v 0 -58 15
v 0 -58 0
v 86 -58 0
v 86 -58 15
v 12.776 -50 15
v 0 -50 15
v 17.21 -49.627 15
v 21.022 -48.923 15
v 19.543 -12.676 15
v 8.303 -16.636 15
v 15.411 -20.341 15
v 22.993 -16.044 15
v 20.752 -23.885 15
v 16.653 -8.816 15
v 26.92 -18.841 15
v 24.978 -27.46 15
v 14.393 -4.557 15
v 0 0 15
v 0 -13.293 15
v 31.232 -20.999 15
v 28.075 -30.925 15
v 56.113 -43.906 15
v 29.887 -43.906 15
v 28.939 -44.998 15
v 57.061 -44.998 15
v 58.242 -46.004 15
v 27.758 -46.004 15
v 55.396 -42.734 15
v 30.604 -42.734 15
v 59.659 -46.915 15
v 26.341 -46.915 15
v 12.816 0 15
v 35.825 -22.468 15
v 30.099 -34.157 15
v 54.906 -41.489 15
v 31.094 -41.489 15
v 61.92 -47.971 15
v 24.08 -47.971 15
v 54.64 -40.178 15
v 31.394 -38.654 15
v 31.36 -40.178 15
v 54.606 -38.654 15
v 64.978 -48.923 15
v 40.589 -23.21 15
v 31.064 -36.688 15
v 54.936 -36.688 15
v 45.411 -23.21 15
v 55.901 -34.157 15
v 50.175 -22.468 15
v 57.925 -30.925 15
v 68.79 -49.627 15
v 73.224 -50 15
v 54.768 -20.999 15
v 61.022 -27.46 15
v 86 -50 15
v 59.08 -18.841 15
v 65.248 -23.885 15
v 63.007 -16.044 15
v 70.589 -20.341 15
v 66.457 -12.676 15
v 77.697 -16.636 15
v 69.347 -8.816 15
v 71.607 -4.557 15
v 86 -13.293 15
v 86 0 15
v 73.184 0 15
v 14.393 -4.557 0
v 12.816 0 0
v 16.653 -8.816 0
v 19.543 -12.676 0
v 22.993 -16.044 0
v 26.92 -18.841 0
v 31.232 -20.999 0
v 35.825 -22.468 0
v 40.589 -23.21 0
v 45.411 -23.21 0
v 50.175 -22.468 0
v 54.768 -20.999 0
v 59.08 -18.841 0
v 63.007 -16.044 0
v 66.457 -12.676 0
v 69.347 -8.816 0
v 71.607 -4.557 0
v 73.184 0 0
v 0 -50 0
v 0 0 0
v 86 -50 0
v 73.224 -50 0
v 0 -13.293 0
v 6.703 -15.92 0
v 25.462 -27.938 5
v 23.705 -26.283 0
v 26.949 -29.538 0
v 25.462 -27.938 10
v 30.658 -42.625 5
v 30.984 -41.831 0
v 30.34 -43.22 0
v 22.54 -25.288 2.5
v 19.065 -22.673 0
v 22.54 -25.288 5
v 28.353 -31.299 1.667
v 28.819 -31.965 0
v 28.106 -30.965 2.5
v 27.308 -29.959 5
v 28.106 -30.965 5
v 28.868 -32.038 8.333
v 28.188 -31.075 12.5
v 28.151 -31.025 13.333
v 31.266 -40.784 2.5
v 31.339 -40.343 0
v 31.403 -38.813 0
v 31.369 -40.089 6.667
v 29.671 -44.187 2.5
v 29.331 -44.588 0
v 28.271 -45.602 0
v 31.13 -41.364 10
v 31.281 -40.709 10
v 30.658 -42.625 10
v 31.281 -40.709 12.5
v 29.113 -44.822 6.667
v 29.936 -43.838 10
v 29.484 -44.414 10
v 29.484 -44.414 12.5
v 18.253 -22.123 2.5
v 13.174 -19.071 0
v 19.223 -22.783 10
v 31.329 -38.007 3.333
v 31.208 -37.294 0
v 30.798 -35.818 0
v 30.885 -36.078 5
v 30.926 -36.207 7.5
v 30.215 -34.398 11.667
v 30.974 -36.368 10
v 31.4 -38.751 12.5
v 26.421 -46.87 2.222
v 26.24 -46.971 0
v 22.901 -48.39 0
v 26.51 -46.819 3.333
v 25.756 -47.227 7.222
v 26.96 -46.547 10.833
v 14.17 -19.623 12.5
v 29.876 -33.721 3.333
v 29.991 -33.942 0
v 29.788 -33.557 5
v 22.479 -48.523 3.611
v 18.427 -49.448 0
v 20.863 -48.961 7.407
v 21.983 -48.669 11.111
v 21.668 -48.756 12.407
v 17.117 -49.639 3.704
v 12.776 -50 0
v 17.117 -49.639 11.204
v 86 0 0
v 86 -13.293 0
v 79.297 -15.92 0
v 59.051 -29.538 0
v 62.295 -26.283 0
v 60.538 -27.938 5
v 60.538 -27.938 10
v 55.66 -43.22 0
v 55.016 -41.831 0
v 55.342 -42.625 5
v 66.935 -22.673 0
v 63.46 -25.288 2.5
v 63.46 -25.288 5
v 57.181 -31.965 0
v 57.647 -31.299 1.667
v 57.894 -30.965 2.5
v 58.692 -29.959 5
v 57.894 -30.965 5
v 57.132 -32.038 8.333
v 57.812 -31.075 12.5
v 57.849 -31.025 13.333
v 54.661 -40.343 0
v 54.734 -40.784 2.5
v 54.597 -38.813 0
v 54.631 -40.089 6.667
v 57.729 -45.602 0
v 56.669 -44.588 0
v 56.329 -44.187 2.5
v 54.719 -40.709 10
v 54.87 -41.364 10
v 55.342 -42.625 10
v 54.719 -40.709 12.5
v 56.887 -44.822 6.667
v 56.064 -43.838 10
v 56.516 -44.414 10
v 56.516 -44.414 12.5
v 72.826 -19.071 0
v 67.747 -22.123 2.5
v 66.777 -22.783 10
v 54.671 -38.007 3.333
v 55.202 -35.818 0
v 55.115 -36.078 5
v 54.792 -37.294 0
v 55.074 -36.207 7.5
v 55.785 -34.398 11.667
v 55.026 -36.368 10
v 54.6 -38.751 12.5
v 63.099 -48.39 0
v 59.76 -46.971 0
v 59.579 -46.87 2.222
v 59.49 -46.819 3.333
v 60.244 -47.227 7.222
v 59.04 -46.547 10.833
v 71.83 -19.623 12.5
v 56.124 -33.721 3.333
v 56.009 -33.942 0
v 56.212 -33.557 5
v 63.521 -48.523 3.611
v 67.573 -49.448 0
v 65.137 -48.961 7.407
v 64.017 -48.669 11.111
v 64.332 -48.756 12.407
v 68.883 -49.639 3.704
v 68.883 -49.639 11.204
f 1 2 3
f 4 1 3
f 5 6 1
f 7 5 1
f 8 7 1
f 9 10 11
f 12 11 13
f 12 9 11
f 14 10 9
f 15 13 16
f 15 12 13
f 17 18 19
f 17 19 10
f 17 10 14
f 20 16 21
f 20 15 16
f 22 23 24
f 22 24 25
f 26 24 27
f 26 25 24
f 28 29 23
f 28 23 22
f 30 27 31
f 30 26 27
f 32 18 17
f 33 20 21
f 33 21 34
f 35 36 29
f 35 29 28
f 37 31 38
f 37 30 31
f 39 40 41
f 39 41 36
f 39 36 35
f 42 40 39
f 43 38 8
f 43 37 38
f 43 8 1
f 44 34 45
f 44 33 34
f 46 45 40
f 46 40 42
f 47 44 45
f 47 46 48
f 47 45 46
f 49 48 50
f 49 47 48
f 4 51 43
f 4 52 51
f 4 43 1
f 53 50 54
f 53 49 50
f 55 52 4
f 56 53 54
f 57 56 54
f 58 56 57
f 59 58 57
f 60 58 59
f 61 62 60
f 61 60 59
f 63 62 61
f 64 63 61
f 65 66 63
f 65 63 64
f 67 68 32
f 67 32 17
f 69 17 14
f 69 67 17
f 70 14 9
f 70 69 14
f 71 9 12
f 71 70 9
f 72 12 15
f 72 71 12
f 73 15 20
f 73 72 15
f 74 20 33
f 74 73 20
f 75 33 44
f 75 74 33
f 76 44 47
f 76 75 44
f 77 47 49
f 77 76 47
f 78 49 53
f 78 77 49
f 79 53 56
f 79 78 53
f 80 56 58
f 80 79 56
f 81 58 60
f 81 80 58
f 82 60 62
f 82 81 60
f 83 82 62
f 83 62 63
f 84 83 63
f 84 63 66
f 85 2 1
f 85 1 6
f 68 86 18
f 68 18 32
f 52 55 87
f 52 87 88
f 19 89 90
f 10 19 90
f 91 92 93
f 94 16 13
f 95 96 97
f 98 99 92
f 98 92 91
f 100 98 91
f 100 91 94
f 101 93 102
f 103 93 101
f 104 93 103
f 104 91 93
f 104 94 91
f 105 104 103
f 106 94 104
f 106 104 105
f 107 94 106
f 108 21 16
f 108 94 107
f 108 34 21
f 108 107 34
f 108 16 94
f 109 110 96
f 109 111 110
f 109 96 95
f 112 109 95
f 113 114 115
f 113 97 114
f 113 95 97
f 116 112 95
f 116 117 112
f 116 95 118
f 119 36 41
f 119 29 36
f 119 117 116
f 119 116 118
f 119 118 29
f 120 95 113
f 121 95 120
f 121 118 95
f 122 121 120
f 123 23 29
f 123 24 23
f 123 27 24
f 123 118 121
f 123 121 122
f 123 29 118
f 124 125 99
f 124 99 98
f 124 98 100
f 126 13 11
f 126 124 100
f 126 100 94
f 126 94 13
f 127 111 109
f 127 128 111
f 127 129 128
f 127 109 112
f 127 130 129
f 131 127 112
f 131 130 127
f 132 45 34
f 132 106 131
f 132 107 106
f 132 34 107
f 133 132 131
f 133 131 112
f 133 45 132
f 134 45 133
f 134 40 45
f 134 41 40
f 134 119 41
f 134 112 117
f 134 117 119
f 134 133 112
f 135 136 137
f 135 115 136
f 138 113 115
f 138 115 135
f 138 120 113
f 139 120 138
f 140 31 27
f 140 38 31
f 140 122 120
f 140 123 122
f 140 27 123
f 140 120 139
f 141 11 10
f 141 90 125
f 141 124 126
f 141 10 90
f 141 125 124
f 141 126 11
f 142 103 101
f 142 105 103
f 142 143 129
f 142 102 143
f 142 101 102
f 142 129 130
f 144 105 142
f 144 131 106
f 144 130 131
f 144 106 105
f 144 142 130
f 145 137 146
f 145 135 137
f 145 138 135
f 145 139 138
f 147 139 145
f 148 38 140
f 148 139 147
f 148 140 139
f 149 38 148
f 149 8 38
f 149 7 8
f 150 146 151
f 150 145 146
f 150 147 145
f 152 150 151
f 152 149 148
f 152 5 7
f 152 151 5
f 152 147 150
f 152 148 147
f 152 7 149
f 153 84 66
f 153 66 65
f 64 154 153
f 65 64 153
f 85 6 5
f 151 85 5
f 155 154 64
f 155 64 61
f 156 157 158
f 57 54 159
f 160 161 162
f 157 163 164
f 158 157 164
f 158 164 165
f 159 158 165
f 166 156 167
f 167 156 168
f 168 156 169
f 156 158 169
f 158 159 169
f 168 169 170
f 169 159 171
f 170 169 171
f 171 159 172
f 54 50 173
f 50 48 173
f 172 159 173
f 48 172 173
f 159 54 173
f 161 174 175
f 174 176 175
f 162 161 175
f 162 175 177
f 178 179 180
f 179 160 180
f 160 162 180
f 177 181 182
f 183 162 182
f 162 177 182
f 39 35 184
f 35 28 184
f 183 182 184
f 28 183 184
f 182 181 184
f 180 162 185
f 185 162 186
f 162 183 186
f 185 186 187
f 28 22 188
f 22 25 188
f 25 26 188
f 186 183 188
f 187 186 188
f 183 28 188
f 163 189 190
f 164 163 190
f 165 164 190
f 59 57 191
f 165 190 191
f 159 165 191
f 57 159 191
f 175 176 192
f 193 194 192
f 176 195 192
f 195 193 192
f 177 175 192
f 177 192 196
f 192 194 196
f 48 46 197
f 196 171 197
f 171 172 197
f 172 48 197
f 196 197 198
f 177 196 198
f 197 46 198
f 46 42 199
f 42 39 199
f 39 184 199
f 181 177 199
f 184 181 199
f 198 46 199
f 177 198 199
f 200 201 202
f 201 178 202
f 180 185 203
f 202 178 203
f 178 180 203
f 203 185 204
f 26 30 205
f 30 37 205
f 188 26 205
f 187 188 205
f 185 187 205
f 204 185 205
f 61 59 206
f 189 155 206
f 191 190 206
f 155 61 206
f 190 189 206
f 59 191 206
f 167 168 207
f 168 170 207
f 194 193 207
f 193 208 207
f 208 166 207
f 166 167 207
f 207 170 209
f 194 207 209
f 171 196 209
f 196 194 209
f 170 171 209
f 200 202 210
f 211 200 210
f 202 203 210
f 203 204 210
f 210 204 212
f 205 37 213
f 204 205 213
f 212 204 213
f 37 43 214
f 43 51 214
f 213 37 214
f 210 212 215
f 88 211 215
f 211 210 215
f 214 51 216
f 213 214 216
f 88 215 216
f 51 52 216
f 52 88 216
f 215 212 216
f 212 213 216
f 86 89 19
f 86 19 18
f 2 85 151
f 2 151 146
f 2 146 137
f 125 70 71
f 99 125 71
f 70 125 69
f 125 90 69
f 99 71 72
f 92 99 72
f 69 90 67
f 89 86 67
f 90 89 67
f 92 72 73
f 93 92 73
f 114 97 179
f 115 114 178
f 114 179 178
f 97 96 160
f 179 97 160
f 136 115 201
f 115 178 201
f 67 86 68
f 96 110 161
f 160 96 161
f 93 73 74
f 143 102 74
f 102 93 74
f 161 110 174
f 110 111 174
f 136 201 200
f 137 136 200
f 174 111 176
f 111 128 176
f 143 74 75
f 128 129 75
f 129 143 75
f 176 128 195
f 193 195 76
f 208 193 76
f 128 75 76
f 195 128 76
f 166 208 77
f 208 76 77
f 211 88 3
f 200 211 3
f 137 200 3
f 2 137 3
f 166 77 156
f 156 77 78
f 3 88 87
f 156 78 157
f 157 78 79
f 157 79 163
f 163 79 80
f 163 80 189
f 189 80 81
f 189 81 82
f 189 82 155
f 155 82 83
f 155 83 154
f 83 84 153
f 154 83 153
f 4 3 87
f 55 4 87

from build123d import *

# Parameters (mm, degrees)
SKETCH_1_W          = 86
SKETCH_1_H          = 58
EXTRUDE_1_DEPTH     = 15
SKETCH_3_R          = 31.2
CUT_EXTRUDE_1_DEPTH = 32
CUT_EXTRUDE_2_DEPTH = 32


with BuildPart() as part:
    # Эскиз1 → Вытянуть1 (new body)
    with BuildSketch(Plane.XY):
        with Locations((43, -29)):
            Rectangle(SKETCH_1_W, SKETCH_1_H)
    extrude(amount=EXTRUDE_1_DEPTH)

    # Эскиз3 → Вырез-Вытянуть1 (cut)
    with BuildSketch(Plane.XY):
        with Locations((43, 7.896260015)):
            Circle(SKETCH_3_R)
    extrude(amount=CUT_EXTRUDE_1_DEPTH, mode=Mode.SUBTRACT)

    # Эскиз6 → Вытянуть2 (cut)
    with BuildSketch(Plane.XY.offset(15)):
        with BuildLine():
            Line((0, -50), (12.775606869, -50))
            add(Edge.make_bspline(
                [(0, -13.292808008), (34.657854921, -25.467090291), (43.133531195, -48.731284944), (12.775606869, -50)],
                knots=[0, 0, 0, 0, 0.936580046, 0.936580046, 0.936580046, 0.936580046], degree=3))
            Line((0, -13.292808008), (-6.736902967, -13.292808008))
            Line((-6.736902967, -13.292808008), (-6.736902967, -50))
            Line((-6.736902967, -50), (0, -50))
        make_face()
        with BuildLine():
            Line((86, -50), (73.224393131, -50))
            add(Edge.make_bspline(
                [(86, -13.292808008), (51.342145079, -25.467090291), (42.866468805, -48.731284944), (73.224393131, -50)],
                knots=[0, 0, 0, 0, 0.936580046, 0.936580046, 0.936580046, 0.936580046], degree=3))
            Line((86, -13.292808008), (92.736902967, -13.292808008))
            Line((92.736902967, -13.292808008), (92.736902967, -50))
            Line((92.736902967, -50), (86, -50))
        make_face()
    extrude(amount=-CUT_EXTRUDE_2_DEPTH, mode=Mode.SUBTRACT)


solid = part.part
